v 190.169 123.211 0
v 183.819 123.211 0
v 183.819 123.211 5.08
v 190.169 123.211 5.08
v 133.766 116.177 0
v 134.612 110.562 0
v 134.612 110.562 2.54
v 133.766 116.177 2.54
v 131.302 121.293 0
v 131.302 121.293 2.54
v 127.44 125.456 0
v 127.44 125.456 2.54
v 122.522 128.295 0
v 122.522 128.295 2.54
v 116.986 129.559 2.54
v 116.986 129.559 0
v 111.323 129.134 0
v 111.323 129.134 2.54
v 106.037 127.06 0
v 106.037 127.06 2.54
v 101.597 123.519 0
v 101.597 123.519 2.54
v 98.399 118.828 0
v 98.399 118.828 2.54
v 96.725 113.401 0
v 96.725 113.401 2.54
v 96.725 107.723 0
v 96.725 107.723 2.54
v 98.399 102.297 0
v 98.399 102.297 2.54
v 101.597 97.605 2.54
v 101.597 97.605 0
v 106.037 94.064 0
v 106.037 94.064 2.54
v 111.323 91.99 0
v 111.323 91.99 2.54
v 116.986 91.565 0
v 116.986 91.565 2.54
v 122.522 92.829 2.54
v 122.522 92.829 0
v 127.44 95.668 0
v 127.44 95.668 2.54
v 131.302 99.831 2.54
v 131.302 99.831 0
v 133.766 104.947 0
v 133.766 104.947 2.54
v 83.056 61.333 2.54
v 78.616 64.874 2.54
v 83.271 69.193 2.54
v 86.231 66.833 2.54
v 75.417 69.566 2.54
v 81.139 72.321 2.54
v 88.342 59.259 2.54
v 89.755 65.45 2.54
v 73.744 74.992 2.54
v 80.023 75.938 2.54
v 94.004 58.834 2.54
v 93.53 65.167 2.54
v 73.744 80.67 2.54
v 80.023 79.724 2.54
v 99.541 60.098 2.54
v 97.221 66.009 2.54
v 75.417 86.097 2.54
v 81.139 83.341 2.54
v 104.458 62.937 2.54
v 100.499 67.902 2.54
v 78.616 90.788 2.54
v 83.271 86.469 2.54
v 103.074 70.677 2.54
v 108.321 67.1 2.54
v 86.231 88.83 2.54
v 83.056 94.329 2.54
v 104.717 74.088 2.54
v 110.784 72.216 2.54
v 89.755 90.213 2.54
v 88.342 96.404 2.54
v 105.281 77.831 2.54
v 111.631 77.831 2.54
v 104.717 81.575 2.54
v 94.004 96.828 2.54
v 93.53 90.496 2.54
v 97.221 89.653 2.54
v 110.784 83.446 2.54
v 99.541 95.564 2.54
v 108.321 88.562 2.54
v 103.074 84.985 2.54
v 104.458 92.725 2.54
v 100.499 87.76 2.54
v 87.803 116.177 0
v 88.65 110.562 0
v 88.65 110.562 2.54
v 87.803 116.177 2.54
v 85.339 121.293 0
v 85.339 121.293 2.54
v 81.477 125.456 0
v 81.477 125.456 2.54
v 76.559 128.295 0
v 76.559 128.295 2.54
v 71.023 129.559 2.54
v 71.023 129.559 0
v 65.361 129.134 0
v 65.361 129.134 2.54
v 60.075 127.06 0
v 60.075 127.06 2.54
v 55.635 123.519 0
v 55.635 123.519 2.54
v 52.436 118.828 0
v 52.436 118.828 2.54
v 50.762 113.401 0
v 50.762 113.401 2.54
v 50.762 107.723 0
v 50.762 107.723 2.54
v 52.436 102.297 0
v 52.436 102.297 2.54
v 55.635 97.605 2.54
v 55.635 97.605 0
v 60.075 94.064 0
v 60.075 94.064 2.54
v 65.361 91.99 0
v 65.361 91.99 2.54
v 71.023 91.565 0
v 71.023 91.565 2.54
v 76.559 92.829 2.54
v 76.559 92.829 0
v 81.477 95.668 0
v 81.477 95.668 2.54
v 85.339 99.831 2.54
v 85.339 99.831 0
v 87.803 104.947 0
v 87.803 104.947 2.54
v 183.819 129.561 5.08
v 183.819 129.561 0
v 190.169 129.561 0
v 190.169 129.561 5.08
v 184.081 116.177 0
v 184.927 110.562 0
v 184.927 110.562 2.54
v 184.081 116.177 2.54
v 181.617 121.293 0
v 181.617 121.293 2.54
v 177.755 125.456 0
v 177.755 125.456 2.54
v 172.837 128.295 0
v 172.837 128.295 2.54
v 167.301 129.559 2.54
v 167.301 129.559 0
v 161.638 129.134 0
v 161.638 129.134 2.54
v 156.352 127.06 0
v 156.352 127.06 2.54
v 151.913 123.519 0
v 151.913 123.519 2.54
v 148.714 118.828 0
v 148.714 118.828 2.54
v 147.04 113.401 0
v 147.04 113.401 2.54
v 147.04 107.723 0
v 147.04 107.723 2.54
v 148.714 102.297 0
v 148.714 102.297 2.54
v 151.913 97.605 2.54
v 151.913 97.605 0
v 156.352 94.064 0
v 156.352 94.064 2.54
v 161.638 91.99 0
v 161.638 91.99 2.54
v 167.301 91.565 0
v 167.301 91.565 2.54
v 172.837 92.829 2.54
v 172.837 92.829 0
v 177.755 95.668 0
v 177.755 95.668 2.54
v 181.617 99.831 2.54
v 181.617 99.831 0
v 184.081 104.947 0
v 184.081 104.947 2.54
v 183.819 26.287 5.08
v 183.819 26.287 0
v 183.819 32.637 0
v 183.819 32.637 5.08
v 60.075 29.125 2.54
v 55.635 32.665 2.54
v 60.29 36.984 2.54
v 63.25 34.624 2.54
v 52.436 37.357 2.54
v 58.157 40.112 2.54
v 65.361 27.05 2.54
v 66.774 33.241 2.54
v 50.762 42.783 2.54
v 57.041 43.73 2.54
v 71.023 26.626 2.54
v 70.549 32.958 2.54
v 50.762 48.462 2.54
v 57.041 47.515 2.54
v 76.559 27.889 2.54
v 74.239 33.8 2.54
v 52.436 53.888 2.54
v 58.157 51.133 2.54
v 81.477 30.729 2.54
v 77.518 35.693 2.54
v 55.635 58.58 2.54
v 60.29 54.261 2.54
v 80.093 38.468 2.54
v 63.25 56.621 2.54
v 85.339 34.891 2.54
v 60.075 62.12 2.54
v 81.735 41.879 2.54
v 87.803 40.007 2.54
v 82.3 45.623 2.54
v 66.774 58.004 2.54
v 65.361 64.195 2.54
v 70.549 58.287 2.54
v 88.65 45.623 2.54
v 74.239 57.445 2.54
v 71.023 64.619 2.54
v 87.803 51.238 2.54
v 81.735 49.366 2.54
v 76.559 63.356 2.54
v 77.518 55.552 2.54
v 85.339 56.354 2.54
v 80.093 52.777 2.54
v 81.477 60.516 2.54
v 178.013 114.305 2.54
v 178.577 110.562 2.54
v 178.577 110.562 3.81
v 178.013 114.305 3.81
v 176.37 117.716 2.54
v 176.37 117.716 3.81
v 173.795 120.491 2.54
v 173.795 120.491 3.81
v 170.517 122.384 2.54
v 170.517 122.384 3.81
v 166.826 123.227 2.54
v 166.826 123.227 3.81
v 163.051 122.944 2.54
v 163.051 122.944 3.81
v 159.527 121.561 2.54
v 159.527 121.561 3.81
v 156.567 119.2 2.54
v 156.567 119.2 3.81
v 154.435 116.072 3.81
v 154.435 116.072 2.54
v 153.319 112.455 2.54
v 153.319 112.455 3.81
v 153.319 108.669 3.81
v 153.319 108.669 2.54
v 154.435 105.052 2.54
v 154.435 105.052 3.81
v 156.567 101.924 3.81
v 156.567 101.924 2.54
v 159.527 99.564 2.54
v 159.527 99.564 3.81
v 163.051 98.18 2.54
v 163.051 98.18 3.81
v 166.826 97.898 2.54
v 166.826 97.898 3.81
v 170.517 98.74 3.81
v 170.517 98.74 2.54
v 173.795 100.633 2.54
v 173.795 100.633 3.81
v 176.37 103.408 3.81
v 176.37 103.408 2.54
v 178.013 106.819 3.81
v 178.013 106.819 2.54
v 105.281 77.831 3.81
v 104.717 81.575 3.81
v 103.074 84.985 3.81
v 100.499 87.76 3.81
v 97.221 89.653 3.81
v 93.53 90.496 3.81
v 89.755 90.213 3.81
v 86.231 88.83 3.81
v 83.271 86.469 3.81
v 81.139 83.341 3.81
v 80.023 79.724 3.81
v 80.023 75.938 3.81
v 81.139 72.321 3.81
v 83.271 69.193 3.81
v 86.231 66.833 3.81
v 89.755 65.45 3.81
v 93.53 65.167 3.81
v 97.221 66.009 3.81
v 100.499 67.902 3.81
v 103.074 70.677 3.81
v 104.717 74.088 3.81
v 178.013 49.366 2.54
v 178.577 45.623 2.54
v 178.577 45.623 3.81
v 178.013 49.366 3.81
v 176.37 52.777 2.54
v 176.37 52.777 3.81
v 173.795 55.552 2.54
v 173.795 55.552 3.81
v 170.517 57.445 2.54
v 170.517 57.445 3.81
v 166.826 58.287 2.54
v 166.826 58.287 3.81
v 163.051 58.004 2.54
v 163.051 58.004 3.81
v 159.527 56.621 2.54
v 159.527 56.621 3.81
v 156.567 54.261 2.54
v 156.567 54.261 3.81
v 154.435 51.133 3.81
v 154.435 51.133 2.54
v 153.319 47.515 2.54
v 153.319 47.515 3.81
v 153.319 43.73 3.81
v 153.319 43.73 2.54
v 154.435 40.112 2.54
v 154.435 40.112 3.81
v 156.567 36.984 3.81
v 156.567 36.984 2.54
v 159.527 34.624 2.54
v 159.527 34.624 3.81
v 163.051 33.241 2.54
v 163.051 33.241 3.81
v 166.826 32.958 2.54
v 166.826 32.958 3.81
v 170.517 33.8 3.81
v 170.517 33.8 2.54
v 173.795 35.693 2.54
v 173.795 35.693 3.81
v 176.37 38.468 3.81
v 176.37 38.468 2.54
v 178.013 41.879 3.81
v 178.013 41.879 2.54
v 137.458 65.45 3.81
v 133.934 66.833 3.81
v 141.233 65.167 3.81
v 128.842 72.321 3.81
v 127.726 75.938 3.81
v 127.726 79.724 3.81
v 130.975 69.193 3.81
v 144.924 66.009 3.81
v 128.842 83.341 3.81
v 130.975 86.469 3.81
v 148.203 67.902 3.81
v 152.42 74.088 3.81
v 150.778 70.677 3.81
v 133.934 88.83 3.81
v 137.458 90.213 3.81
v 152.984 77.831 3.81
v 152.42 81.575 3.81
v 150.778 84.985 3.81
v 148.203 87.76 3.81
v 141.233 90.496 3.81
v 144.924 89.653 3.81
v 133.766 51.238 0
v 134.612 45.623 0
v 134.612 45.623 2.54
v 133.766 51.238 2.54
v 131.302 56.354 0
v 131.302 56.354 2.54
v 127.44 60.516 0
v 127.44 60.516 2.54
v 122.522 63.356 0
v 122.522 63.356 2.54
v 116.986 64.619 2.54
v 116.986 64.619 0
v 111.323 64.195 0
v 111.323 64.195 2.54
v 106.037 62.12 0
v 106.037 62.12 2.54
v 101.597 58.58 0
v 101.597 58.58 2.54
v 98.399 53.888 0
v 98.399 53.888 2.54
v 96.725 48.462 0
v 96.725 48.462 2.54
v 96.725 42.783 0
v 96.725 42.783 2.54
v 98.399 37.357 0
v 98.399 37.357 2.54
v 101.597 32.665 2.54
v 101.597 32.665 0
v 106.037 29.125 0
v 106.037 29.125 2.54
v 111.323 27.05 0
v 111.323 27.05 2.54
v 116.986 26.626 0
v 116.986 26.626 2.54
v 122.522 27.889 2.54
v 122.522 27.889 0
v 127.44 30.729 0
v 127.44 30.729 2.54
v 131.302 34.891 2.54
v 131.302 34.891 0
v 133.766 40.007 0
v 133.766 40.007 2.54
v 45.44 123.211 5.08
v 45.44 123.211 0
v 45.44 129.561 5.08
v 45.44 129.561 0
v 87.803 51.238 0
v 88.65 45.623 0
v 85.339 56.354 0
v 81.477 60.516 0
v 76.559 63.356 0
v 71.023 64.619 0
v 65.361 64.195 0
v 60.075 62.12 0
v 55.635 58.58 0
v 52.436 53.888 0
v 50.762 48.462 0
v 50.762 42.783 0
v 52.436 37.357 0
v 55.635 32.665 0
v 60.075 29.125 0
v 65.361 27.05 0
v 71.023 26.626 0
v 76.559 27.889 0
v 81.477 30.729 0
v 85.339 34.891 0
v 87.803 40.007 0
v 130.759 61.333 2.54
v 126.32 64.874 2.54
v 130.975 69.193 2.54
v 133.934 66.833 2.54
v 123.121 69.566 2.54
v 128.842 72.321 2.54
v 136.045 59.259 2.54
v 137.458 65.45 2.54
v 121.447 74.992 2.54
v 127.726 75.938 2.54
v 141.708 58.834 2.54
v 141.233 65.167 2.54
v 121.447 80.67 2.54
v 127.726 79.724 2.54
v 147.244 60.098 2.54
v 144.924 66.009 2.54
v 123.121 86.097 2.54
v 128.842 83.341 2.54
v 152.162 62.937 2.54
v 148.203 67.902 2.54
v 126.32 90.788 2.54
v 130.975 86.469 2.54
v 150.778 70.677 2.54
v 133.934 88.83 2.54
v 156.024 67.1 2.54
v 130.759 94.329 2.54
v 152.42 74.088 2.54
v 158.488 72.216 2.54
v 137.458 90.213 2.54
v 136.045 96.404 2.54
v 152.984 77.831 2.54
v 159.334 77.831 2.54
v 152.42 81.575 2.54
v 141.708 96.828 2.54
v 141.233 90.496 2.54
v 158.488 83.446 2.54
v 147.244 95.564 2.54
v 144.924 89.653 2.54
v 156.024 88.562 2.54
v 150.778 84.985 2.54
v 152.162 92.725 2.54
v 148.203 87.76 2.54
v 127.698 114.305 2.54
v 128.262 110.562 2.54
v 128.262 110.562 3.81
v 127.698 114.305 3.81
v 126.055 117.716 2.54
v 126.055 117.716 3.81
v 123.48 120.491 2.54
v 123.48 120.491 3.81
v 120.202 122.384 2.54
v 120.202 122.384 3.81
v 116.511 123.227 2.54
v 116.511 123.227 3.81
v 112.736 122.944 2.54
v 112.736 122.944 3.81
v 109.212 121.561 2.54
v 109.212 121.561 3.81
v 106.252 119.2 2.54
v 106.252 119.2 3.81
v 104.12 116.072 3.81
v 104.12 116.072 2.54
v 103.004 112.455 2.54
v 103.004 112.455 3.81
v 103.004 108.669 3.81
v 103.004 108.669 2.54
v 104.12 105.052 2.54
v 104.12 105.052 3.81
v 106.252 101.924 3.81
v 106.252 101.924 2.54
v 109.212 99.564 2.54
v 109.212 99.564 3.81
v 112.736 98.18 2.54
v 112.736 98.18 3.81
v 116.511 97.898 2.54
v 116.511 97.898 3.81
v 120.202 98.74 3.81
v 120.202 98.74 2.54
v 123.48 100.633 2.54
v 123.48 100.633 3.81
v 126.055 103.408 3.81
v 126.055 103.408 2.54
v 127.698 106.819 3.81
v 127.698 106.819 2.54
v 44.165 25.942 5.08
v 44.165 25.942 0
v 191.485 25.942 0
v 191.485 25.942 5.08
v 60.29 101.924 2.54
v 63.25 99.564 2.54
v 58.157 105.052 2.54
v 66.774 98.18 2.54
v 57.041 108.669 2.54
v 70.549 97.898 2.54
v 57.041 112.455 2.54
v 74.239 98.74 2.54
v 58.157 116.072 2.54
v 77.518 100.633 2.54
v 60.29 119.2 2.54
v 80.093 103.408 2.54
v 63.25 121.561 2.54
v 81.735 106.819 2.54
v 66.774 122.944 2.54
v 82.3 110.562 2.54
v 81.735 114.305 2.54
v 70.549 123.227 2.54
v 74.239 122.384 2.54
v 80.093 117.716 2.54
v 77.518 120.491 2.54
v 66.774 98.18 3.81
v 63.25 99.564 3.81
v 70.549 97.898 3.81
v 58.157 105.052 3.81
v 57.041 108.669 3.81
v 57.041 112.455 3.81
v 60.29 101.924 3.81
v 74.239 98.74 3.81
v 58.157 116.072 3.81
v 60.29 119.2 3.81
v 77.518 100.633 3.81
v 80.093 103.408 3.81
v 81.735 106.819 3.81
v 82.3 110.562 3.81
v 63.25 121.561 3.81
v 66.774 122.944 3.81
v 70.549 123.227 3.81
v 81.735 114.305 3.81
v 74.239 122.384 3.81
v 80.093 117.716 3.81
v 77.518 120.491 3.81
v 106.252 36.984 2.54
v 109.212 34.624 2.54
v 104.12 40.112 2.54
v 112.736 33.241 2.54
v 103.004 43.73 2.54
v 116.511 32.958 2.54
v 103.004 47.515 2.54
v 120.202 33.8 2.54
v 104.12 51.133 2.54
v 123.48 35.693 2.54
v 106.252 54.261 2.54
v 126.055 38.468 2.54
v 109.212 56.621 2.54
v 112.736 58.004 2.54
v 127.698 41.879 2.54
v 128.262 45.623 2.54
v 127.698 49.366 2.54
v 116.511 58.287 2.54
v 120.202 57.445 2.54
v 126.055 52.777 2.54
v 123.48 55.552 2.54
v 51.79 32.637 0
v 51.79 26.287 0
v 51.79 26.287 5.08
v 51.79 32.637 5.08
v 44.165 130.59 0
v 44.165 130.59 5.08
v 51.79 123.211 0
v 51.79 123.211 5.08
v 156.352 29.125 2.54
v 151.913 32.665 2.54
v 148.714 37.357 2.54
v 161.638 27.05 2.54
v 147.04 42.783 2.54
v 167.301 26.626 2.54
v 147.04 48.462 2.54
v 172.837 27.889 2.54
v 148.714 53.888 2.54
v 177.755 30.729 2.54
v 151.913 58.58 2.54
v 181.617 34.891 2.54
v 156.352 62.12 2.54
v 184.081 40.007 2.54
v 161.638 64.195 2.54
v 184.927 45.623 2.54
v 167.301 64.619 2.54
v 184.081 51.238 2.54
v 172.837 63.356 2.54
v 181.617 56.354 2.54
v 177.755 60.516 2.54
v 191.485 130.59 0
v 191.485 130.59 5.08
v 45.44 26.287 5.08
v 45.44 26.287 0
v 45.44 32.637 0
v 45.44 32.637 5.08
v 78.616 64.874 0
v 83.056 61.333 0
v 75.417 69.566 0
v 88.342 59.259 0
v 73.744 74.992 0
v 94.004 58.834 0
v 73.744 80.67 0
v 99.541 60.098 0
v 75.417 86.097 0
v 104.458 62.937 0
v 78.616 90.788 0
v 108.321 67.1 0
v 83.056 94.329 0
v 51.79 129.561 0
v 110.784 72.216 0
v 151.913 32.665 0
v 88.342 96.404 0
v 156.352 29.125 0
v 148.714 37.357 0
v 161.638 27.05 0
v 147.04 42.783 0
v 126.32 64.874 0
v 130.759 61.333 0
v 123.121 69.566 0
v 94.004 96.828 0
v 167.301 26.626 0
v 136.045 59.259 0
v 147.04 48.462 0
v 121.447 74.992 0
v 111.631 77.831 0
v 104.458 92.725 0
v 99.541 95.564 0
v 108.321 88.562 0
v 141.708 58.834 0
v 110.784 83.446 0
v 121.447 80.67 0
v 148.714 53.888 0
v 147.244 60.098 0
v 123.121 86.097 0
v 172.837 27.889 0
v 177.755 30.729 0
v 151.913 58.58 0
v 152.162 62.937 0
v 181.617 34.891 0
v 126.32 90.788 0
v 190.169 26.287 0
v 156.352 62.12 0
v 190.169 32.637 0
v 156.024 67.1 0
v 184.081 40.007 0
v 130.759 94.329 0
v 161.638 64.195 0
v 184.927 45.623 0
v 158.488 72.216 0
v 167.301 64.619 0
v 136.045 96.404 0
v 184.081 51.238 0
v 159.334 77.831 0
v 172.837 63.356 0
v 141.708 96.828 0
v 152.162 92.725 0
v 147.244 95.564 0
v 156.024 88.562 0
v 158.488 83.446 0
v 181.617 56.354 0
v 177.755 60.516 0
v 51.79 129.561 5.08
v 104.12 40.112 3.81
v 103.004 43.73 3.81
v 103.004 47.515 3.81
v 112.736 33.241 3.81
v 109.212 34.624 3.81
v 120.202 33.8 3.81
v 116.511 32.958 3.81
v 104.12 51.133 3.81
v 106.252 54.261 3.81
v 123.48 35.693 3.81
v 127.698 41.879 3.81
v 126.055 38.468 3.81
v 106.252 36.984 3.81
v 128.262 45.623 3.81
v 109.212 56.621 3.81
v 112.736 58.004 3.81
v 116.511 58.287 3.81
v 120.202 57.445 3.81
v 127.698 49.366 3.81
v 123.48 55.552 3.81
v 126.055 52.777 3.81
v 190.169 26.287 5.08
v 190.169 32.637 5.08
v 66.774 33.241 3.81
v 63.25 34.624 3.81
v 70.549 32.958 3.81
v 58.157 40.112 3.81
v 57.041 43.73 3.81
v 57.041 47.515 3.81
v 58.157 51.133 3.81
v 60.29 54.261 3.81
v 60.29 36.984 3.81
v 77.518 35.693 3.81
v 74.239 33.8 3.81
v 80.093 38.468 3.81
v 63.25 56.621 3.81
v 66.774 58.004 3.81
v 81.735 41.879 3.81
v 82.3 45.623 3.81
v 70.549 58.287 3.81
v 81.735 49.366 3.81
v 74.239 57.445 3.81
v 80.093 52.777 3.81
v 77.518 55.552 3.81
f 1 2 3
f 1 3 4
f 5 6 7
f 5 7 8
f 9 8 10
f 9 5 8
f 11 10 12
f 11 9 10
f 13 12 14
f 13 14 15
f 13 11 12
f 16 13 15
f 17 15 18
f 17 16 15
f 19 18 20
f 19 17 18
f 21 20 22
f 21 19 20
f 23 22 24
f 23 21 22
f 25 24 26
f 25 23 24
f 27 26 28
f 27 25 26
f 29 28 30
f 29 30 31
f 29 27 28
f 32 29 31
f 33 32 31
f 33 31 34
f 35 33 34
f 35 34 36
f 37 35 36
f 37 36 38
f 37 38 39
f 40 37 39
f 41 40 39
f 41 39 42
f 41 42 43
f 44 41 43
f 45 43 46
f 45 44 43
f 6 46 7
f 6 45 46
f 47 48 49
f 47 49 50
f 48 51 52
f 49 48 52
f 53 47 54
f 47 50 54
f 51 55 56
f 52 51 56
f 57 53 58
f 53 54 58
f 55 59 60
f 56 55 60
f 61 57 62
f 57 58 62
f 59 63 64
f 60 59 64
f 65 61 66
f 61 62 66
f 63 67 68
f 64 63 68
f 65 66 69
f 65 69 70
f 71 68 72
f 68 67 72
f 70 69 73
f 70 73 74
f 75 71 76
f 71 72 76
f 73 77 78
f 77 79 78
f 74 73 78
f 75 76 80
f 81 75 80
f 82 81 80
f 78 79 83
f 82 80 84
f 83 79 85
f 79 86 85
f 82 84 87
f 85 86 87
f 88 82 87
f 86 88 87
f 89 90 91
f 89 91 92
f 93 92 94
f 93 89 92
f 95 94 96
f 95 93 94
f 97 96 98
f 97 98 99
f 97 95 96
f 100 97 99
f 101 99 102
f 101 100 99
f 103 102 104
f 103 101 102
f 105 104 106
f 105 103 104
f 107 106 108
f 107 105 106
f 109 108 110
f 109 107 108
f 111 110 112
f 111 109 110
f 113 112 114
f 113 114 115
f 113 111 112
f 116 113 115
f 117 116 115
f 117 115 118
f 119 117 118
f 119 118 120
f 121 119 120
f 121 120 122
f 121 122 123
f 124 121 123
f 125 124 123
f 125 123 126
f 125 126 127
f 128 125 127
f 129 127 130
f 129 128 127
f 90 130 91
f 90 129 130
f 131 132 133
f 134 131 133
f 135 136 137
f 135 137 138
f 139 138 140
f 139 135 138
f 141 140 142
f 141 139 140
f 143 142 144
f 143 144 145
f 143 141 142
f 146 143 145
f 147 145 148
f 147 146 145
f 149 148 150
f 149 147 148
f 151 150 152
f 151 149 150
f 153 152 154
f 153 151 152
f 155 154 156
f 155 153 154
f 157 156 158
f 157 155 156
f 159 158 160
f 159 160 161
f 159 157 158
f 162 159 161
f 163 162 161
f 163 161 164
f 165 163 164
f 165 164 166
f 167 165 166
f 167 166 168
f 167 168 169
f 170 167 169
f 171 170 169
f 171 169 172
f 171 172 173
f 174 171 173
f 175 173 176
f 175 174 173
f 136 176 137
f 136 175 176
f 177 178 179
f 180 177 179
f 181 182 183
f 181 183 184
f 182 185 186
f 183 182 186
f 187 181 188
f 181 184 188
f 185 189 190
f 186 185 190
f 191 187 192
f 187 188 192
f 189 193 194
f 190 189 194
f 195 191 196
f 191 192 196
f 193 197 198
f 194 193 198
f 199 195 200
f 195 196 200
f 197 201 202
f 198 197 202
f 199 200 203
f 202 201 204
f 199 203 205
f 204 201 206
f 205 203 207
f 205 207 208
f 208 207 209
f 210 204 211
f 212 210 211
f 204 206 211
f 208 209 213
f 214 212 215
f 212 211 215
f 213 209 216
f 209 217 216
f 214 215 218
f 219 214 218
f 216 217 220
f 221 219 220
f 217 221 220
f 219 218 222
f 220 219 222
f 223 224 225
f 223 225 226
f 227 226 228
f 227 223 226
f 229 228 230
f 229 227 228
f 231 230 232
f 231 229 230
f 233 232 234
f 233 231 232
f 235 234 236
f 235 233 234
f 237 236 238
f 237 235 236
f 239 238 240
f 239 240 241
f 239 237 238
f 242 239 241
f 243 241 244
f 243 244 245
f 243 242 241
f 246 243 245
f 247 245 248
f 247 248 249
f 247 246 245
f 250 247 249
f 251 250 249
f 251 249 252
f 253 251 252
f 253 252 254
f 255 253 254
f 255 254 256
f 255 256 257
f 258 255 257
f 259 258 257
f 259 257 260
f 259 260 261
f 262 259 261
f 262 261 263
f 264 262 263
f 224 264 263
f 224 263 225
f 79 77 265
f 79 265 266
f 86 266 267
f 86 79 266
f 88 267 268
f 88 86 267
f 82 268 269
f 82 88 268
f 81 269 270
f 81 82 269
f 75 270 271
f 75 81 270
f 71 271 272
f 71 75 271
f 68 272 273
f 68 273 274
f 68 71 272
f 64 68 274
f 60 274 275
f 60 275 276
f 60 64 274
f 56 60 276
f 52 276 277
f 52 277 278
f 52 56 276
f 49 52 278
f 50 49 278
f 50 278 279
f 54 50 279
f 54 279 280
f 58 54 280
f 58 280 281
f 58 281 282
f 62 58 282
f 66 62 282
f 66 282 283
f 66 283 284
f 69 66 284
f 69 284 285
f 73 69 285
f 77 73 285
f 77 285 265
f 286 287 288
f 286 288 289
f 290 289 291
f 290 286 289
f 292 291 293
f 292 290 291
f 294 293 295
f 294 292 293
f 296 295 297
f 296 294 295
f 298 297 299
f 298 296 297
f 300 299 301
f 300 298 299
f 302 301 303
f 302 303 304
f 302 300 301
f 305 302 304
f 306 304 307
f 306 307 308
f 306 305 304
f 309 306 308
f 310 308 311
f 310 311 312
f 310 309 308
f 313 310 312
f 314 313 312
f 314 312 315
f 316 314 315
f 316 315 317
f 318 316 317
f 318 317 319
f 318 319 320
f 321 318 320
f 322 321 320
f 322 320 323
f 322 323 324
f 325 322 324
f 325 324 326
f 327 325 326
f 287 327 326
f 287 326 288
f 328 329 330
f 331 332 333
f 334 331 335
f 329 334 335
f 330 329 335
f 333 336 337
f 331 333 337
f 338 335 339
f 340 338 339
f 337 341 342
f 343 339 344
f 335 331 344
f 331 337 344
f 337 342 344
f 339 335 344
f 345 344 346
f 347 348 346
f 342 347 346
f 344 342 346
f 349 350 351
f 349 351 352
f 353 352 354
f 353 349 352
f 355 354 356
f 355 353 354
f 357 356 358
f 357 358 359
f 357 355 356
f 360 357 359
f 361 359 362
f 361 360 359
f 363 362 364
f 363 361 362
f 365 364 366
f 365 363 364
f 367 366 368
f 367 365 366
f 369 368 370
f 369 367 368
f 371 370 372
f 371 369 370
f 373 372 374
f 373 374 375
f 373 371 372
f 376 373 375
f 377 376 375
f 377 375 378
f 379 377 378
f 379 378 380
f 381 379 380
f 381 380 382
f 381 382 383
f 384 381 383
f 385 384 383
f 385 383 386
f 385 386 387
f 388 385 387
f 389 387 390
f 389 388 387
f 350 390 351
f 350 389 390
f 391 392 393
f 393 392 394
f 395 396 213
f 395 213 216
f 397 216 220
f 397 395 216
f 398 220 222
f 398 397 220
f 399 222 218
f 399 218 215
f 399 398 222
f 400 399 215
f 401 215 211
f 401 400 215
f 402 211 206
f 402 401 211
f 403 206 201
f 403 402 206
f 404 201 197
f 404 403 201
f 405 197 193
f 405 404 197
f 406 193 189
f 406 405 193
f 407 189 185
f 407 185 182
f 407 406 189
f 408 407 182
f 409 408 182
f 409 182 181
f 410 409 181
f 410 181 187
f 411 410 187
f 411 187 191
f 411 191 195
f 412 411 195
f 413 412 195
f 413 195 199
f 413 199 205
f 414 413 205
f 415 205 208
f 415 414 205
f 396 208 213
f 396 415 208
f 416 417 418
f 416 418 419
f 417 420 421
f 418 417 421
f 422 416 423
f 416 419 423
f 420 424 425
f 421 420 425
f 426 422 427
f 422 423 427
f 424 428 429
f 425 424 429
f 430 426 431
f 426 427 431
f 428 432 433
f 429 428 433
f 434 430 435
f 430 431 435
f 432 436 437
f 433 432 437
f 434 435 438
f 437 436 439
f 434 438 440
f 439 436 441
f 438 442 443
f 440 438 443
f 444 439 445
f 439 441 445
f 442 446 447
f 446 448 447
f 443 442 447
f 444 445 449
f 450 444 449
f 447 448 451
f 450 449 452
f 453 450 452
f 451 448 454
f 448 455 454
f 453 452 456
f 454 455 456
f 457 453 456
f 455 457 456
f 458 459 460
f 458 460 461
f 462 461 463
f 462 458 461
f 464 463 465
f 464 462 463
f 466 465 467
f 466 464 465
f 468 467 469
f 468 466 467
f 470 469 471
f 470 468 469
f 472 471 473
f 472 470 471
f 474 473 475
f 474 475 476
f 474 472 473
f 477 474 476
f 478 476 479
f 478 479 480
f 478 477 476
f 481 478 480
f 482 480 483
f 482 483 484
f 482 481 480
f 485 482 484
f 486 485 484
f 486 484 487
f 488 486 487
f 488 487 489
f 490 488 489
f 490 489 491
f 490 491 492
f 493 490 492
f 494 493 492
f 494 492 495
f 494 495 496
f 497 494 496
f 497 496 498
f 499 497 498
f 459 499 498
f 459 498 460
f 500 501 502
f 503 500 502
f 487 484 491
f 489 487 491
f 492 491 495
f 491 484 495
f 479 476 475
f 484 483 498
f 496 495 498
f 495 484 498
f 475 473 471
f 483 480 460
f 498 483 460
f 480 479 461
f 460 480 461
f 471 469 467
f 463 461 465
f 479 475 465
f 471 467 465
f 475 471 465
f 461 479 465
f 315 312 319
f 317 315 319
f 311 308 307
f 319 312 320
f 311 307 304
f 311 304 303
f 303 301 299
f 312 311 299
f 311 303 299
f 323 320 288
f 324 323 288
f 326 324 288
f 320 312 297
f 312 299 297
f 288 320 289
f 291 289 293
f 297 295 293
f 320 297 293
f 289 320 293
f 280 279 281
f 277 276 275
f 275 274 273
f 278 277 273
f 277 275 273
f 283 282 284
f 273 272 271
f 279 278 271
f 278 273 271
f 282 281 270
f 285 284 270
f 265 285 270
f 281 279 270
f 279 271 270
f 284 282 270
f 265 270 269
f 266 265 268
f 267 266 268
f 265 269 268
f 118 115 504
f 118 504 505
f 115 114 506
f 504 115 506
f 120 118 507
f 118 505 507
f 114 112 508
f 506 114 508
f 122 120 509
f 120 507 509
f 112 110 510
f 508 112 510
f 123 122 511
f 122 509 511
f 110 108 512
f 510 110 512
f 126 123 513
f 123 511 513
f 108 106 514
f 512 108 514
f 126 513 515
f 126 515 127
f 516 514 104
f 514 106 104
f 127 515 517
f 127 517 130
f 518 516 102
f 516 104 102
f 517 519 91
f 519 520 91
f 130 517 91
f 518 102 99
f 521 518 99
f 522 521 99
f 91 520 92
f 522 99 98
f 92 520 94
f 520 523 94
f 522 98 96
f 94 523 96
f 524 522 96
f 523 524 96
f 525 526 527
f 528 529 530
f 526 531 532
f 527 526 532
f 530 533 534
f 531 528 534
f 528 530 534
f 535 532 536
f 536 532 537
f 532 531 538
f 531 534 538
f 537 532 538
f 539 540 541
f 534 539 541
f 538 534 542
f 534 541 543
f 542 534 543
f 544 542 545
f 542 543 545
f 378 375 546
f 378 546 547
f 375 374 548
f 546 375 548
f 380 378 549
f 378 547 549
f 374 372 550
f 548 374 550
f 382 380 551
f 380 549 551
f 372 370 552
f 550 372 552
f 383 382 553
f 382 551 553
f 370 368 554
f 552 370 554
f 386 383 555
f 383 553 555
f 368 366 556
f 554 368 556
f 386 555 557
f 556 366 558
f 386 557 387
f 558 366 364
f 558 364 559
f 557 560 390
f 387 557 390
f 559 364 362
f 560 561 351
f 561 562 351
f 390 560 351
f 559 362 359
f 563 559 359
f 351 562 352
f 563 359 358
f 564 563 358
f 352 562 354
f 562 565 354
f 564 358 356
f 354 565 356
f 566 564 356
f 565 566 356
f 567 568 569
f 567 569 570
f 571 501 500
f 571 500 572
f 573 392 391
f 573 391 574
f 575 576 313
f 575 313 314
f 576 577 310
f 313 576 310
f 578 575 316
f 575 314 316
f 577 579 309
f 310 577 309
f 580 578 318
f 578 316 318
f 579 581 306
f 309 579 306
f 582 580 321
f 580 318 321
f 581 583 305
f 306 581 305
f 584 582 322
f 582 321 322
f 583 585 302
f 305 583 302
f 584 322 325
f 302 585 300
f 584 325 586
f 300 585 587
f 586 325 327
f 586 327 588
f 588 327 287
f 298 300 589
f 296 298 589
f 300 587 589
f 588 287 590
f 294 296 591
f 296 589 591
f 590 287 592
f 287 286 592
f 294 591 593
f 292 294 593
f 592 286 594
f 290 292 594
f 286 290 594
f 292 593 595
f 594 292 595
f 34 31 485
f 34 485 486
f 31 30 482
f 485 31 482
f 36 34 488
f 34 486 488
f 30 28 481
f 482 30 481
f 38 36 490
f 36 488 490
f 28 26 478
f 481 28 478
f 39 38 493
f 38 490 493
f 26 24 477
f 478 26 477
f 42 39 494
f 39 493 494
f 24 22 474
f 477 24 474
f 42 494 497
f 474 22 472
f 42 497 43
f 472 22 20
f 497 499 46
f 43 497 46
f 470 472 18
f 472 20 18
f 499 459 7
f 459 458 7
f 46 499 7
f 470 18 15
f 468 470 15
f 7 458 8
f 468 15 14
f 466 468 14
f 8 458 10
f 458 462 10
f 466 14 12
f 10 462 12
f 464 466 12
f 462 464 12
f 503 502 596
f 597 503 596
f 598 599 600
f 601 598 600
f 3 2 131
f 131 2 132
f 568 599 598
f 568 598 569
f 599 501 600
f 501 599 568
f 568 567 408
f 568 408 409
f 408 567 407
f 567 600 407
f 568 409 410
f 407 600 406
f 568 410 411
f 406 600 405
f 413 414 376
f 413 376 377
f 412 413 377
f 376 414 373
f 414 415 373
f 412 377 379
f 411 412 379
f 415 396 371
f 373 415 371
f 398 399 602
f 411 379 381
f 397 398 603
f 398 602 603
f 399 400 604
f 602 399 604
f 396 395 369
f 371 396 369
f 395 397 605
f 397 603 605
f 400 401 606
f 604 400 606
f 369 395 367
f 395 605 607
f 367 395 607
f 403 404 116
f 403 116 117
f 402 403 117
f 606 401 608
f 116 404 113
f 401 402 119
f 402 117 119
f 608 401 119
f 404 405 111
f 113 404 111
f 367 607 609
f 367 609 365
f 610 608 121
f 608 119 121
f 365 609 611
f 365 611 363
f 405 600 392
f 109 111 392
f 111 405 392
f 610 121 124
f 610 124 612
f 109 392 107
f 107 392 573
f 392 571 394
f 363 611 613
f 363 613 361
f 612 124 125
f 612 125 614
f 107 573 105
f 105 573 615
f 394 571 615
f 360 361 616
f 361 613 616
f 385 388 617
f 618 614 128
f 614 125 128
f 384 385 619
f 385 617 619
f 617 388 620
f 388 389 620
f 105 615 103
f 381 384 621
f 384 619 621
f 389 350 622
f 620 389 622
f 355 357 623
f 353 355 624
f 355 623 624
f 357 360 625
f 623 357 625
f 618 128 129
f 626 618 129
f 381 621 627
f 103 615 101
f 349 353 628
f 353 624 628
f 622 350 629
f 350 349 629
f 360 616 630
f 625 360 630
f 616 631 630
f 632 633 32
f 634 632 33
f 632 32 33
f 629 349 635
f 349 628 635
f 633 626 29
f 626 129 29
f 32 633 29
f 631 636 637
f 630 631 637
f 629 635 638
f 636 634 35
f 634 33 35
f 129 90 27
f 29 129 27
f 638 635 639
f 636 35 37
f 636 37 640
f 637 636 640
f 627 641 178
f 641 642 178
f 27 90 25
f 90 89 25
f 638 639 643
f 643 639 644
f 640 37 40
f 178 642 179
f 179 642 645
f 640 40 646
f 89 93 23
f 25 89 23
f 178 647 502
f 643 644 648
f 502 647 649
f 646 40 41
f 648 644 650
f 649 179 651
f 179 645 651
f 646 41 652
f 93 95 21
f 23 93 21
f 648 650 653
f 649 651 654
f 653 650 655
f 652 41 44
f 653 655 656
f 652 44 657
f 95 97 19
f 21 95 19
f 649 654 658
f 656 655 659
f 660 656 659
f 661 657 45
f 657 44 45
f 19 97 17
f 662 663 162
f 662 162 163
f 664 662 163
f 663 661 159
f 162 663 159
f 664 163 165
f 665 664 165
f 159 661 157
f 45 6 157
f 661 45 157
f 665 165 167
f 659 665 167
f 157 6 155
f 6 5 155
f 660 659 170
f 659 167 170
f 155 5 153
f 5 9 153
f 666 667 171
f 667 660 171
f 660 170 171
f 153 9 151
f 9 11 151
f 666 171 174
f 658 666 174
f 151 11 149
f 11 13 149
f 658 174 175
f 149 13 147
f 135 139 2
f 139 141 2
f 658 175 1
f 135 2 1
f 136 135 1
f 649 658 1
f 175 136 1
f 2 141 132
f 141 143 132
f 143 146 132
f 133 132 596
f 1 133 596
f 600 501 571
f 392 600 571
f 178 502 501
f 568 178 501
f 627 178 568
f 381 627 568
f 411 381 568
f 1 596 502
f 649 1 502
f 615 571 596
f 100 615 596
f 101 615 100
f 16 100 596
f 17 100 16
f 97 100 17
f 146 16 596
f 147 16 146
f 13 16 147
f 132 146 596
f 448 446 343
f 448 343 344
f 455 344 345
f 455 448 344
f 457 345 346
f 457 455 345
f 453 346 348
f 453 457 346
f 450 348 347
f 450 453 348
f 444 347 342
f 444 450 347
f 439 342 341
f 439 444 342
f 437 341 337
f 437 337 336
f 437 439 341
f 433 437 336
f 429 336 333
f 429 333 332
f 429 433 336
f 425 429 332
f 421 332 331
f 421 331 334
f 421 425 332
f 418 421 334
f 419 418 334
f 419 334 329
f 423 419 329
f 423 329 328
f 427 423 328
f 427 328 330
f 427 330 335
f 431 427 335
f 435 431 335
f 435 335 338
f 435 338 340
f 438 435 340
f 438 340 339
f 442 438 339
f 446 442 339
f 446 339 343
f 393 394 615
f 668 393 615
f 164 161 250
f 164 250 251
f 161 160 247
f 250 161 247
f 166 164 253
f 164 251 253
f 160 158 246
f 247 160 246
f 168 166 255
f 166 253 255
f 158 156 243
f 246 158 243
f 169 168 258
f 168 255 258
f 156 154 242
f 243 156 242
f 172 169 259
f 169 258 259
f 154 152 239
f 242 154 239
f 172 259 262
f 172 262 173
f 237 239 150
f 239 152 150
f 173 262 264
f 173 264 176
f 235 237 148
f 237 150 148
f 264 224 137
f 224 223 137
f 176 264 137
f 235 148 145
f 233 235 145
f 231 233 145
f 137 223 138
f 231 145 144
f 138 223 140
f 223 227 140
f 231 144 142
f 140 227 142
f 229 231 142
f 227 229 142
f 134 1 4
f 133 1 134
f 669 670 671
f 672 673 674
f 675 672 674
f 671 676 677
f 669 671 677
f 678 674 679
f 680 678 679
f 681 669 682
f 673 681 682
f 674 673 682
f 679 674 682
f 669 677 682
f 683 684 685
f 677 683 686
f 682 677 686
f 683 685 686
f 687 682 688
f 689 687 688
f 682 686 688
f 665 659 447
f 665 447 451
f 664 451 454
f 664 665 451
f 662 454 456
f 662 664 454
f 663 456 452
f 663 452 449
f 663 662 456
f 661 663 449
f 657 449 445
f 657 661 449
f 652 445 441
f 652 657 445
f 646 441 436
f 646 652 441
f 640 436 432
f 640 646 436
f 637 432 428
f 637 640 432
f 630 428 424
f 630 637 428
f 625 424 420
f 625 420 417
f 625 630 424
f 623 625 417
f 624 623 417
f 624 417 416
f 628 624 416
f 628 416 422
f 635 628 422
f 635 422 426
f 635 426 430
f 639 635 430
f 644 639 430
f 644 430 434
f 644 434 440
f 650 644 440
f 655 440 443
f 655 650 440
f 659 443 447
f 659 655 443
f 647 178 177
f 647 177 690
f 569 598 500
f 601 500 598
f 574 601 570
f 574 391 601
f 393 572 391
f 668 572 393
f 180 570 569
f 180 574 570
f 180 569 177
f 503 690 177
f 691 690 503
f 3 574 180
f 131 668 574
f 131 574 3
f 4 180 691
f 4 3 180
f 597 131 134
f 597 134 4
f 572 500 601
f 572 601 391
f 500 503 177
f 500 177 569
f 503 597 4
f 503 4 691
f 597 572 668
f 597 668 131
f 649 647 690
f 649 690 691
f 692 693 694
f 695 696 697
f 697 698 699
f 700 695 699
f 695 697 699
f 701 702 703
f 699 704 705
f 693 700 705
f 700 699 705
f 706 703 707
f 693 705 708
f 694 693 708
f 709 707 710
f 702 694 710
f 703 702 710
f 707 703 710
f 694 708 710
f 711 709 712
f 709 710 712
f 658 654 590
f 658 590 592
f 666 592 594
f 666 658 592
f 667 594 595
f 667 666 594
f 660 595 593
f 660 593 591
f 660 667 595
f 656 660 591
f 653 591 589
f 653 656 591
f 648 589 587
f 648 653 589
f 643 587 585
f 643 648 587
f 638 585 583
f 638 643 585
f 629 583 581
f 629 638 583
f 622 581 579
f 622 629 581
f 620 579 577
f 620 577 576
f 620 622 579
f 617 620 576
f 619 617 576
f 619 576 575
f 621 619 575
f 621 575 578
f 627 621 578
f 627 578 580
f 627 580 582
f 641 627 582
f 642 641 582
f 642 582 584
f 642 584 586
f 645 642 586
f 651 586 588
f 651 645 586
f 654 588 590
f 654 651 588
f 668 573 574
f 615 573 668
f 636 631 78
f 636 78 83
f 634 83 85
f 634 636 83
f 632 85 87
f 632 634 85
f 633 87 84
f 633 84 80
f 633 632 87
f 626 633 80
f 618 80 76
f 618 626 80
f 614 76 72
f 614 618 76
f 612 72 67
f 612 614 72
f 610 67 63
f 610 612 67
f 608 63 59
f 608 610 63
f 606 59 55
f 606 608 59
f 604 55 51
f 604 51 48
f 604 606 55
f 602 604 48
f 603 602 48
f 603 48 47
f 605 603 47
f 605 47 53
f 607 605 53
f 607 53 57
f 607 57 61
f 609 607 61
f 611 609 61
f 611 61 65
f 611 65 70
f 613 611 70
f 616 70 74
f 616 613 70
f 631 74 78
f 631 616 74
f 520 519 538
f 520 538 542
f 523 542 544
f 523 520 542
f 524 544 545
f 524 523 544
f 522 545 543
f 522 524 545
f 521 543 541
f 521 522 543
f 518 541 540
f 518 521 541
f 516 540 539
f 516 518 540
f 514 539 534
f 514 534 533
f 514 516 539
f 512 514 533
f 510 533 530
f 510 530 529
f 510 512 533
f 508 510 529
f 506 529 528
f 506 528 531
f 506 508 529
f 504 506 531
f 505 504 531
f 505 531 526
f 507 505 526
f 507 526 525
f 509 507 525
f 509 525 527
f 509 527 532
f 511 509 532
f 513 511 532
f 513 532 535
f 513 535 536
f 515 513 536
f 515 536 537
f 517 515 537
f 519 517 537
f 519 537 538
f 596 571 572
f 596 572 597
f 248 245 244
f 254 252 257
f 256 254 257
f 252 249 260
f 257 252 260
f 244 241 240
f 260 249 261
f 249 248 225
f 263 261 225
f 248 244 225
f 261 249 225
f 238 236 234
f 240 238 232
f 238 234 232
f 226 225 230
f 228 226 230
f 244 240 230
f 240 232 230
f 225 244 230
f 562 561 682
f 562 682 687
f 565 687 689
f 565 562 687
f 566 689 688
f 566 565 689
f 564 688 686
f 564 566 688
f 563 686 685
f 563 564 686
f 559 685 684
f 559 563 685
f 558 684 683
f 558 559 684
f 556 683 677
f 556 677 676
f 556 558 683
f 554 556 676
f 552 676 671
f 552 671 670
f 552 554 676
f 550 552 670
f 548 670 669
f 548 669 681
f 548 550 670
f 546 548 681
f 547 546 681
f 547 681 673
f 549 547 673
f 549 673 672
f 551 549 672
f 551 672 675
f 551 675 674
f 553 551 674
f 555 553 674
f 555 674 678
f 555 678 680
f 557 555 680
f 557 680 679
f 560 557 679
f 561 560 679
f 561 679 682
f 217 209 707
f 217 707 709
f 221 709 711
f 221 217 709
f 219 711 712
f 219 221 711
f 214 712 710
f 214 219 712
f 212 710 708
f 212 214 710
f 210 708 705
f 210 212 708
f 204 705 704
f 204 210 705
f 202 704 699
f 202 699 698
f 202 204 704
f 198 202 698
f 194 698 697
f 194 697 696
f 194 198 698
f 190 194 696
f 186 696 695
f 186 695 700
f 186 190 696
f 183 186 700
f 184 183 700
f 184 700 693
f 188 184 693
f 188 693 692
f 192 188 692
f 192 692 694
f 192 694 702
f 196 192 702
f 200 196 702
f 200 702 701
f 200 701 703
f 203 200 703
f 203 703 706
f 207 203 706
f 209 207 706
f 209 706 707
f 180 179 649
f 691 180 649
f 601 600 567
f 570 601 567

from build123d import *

# Parameters (mm, degrees)
SKETCH2_W           = 147.32
SKETCH2_H           = 104.648
BOSS_EXTRUDE1_DEPTH = 5.08
SKETCH3_R           = 19.05
CUT_EXTRUDE1_DEPTH  = 2.54
SKETCH4_R           = 12.7
CUT_EXTRUDE2_DEPTH  = 3.81
SKETCH5_W           = 6.35
SKETCH5_H           = 6.35
CUT_EXTRUDE3_DEPTH  = 6.35


with BuildPart() as part:
    # Sketch2 → Boss-Extrude1 (new body)
    with BuildSketch(Plane.XY):
        with Locations((117.825395055, 78.266401141)):
            Rectangle(SKETCH2_W, SKETCH2_H)
    extrude(amount=BOSS_EXTRUDE1_DEPTH)

    # Sketch3 → Cut-Extrude1 (cut)
    with BuildSketch(Plane.XY):
        with Locations((69.599550134, 110.562048191)):
            Circle(SKETCH3_R)
        with Locations((69.599550134, 45.622553044)):
            Circle(SKETCH3_R)
        with Locations((92.580819194, 77.831149833)):
            Circle(SKETCH3_R)
        with Locations((115.562088254, 110.562048191)):
            Circle(SKETCH3_R)
        with Locations((115.562088254, 45.622553044)):
            Circle(SKETCH3_R)
        with Locations((140.284362546, 77.831149833)):
            Circle(SKETCH3_R)
        with Locations((165.877139454, 110.562048191)):
            Circle(SKETCH3_R)
        with Locations((165.877139454, 45.622553044)):
            Circle(SKETCH3_R)
    extrude(amount=CUT_EXTRUDE1_DEPTH, mode=Mode.SUBTRACT)

    # Sketch4 → Cut-Extrude2 (cut)
    with BuildSketch(Plane.XY):
        with Locations((69.599550134, 45.622553044)):
            Circle(SKETCH4_R)
        with Locations((115.562088254, 45.622553044)):
            Circle(SKETCH4_R)
        with Locations((165.877139454, 45.622553044)):
            Circle(SKETCH4_R)
        with Locations((92.580819194, 77.831149833)):
            Circle(SKETCH4_R)
        with Locations((140.284362546, 77.831149833)):
            Circle(SKETCH4_R)
        with Locations((69.599550134, 110.562048191)):
            Circle(SKETCH4_R)
        with Locations((115.562088254, 110.562048191)):
            Circle(SKETCH4_R)
        with Locations((165.877139454, 110.562048191)):
            Circle(SKETCH4_R)
    extrude(amount=CUT_EXTRUDE2_DEPTH, mode=Mode.SUBTRACT)

    # Sketch5 → Cut-Extrude3 (cut)
    with BuildSketch(Plane.XY):
        with Locations((48.615350013, 29.461567224)):
            Rectangle(SKETCH5_W, SKETCH5_H)
        with Locations((186.994201874, 29.461567224)):
            Rectangle(SKETCH5_W, SKETCH5_H)
        with Locations((186.994201874, 126.386007845)):
            Rectangle(SKETCH5_W, SKETCH5_H)
        with Locations((48.615350013, 126.386007845)):
            Rectangle(SKETCH5_W, SKETCH5_H)
    extrude(amount=CUT_EXTRUDE3_DEPTH, mode=Mode.SUBTRACT)


solid = part.part
